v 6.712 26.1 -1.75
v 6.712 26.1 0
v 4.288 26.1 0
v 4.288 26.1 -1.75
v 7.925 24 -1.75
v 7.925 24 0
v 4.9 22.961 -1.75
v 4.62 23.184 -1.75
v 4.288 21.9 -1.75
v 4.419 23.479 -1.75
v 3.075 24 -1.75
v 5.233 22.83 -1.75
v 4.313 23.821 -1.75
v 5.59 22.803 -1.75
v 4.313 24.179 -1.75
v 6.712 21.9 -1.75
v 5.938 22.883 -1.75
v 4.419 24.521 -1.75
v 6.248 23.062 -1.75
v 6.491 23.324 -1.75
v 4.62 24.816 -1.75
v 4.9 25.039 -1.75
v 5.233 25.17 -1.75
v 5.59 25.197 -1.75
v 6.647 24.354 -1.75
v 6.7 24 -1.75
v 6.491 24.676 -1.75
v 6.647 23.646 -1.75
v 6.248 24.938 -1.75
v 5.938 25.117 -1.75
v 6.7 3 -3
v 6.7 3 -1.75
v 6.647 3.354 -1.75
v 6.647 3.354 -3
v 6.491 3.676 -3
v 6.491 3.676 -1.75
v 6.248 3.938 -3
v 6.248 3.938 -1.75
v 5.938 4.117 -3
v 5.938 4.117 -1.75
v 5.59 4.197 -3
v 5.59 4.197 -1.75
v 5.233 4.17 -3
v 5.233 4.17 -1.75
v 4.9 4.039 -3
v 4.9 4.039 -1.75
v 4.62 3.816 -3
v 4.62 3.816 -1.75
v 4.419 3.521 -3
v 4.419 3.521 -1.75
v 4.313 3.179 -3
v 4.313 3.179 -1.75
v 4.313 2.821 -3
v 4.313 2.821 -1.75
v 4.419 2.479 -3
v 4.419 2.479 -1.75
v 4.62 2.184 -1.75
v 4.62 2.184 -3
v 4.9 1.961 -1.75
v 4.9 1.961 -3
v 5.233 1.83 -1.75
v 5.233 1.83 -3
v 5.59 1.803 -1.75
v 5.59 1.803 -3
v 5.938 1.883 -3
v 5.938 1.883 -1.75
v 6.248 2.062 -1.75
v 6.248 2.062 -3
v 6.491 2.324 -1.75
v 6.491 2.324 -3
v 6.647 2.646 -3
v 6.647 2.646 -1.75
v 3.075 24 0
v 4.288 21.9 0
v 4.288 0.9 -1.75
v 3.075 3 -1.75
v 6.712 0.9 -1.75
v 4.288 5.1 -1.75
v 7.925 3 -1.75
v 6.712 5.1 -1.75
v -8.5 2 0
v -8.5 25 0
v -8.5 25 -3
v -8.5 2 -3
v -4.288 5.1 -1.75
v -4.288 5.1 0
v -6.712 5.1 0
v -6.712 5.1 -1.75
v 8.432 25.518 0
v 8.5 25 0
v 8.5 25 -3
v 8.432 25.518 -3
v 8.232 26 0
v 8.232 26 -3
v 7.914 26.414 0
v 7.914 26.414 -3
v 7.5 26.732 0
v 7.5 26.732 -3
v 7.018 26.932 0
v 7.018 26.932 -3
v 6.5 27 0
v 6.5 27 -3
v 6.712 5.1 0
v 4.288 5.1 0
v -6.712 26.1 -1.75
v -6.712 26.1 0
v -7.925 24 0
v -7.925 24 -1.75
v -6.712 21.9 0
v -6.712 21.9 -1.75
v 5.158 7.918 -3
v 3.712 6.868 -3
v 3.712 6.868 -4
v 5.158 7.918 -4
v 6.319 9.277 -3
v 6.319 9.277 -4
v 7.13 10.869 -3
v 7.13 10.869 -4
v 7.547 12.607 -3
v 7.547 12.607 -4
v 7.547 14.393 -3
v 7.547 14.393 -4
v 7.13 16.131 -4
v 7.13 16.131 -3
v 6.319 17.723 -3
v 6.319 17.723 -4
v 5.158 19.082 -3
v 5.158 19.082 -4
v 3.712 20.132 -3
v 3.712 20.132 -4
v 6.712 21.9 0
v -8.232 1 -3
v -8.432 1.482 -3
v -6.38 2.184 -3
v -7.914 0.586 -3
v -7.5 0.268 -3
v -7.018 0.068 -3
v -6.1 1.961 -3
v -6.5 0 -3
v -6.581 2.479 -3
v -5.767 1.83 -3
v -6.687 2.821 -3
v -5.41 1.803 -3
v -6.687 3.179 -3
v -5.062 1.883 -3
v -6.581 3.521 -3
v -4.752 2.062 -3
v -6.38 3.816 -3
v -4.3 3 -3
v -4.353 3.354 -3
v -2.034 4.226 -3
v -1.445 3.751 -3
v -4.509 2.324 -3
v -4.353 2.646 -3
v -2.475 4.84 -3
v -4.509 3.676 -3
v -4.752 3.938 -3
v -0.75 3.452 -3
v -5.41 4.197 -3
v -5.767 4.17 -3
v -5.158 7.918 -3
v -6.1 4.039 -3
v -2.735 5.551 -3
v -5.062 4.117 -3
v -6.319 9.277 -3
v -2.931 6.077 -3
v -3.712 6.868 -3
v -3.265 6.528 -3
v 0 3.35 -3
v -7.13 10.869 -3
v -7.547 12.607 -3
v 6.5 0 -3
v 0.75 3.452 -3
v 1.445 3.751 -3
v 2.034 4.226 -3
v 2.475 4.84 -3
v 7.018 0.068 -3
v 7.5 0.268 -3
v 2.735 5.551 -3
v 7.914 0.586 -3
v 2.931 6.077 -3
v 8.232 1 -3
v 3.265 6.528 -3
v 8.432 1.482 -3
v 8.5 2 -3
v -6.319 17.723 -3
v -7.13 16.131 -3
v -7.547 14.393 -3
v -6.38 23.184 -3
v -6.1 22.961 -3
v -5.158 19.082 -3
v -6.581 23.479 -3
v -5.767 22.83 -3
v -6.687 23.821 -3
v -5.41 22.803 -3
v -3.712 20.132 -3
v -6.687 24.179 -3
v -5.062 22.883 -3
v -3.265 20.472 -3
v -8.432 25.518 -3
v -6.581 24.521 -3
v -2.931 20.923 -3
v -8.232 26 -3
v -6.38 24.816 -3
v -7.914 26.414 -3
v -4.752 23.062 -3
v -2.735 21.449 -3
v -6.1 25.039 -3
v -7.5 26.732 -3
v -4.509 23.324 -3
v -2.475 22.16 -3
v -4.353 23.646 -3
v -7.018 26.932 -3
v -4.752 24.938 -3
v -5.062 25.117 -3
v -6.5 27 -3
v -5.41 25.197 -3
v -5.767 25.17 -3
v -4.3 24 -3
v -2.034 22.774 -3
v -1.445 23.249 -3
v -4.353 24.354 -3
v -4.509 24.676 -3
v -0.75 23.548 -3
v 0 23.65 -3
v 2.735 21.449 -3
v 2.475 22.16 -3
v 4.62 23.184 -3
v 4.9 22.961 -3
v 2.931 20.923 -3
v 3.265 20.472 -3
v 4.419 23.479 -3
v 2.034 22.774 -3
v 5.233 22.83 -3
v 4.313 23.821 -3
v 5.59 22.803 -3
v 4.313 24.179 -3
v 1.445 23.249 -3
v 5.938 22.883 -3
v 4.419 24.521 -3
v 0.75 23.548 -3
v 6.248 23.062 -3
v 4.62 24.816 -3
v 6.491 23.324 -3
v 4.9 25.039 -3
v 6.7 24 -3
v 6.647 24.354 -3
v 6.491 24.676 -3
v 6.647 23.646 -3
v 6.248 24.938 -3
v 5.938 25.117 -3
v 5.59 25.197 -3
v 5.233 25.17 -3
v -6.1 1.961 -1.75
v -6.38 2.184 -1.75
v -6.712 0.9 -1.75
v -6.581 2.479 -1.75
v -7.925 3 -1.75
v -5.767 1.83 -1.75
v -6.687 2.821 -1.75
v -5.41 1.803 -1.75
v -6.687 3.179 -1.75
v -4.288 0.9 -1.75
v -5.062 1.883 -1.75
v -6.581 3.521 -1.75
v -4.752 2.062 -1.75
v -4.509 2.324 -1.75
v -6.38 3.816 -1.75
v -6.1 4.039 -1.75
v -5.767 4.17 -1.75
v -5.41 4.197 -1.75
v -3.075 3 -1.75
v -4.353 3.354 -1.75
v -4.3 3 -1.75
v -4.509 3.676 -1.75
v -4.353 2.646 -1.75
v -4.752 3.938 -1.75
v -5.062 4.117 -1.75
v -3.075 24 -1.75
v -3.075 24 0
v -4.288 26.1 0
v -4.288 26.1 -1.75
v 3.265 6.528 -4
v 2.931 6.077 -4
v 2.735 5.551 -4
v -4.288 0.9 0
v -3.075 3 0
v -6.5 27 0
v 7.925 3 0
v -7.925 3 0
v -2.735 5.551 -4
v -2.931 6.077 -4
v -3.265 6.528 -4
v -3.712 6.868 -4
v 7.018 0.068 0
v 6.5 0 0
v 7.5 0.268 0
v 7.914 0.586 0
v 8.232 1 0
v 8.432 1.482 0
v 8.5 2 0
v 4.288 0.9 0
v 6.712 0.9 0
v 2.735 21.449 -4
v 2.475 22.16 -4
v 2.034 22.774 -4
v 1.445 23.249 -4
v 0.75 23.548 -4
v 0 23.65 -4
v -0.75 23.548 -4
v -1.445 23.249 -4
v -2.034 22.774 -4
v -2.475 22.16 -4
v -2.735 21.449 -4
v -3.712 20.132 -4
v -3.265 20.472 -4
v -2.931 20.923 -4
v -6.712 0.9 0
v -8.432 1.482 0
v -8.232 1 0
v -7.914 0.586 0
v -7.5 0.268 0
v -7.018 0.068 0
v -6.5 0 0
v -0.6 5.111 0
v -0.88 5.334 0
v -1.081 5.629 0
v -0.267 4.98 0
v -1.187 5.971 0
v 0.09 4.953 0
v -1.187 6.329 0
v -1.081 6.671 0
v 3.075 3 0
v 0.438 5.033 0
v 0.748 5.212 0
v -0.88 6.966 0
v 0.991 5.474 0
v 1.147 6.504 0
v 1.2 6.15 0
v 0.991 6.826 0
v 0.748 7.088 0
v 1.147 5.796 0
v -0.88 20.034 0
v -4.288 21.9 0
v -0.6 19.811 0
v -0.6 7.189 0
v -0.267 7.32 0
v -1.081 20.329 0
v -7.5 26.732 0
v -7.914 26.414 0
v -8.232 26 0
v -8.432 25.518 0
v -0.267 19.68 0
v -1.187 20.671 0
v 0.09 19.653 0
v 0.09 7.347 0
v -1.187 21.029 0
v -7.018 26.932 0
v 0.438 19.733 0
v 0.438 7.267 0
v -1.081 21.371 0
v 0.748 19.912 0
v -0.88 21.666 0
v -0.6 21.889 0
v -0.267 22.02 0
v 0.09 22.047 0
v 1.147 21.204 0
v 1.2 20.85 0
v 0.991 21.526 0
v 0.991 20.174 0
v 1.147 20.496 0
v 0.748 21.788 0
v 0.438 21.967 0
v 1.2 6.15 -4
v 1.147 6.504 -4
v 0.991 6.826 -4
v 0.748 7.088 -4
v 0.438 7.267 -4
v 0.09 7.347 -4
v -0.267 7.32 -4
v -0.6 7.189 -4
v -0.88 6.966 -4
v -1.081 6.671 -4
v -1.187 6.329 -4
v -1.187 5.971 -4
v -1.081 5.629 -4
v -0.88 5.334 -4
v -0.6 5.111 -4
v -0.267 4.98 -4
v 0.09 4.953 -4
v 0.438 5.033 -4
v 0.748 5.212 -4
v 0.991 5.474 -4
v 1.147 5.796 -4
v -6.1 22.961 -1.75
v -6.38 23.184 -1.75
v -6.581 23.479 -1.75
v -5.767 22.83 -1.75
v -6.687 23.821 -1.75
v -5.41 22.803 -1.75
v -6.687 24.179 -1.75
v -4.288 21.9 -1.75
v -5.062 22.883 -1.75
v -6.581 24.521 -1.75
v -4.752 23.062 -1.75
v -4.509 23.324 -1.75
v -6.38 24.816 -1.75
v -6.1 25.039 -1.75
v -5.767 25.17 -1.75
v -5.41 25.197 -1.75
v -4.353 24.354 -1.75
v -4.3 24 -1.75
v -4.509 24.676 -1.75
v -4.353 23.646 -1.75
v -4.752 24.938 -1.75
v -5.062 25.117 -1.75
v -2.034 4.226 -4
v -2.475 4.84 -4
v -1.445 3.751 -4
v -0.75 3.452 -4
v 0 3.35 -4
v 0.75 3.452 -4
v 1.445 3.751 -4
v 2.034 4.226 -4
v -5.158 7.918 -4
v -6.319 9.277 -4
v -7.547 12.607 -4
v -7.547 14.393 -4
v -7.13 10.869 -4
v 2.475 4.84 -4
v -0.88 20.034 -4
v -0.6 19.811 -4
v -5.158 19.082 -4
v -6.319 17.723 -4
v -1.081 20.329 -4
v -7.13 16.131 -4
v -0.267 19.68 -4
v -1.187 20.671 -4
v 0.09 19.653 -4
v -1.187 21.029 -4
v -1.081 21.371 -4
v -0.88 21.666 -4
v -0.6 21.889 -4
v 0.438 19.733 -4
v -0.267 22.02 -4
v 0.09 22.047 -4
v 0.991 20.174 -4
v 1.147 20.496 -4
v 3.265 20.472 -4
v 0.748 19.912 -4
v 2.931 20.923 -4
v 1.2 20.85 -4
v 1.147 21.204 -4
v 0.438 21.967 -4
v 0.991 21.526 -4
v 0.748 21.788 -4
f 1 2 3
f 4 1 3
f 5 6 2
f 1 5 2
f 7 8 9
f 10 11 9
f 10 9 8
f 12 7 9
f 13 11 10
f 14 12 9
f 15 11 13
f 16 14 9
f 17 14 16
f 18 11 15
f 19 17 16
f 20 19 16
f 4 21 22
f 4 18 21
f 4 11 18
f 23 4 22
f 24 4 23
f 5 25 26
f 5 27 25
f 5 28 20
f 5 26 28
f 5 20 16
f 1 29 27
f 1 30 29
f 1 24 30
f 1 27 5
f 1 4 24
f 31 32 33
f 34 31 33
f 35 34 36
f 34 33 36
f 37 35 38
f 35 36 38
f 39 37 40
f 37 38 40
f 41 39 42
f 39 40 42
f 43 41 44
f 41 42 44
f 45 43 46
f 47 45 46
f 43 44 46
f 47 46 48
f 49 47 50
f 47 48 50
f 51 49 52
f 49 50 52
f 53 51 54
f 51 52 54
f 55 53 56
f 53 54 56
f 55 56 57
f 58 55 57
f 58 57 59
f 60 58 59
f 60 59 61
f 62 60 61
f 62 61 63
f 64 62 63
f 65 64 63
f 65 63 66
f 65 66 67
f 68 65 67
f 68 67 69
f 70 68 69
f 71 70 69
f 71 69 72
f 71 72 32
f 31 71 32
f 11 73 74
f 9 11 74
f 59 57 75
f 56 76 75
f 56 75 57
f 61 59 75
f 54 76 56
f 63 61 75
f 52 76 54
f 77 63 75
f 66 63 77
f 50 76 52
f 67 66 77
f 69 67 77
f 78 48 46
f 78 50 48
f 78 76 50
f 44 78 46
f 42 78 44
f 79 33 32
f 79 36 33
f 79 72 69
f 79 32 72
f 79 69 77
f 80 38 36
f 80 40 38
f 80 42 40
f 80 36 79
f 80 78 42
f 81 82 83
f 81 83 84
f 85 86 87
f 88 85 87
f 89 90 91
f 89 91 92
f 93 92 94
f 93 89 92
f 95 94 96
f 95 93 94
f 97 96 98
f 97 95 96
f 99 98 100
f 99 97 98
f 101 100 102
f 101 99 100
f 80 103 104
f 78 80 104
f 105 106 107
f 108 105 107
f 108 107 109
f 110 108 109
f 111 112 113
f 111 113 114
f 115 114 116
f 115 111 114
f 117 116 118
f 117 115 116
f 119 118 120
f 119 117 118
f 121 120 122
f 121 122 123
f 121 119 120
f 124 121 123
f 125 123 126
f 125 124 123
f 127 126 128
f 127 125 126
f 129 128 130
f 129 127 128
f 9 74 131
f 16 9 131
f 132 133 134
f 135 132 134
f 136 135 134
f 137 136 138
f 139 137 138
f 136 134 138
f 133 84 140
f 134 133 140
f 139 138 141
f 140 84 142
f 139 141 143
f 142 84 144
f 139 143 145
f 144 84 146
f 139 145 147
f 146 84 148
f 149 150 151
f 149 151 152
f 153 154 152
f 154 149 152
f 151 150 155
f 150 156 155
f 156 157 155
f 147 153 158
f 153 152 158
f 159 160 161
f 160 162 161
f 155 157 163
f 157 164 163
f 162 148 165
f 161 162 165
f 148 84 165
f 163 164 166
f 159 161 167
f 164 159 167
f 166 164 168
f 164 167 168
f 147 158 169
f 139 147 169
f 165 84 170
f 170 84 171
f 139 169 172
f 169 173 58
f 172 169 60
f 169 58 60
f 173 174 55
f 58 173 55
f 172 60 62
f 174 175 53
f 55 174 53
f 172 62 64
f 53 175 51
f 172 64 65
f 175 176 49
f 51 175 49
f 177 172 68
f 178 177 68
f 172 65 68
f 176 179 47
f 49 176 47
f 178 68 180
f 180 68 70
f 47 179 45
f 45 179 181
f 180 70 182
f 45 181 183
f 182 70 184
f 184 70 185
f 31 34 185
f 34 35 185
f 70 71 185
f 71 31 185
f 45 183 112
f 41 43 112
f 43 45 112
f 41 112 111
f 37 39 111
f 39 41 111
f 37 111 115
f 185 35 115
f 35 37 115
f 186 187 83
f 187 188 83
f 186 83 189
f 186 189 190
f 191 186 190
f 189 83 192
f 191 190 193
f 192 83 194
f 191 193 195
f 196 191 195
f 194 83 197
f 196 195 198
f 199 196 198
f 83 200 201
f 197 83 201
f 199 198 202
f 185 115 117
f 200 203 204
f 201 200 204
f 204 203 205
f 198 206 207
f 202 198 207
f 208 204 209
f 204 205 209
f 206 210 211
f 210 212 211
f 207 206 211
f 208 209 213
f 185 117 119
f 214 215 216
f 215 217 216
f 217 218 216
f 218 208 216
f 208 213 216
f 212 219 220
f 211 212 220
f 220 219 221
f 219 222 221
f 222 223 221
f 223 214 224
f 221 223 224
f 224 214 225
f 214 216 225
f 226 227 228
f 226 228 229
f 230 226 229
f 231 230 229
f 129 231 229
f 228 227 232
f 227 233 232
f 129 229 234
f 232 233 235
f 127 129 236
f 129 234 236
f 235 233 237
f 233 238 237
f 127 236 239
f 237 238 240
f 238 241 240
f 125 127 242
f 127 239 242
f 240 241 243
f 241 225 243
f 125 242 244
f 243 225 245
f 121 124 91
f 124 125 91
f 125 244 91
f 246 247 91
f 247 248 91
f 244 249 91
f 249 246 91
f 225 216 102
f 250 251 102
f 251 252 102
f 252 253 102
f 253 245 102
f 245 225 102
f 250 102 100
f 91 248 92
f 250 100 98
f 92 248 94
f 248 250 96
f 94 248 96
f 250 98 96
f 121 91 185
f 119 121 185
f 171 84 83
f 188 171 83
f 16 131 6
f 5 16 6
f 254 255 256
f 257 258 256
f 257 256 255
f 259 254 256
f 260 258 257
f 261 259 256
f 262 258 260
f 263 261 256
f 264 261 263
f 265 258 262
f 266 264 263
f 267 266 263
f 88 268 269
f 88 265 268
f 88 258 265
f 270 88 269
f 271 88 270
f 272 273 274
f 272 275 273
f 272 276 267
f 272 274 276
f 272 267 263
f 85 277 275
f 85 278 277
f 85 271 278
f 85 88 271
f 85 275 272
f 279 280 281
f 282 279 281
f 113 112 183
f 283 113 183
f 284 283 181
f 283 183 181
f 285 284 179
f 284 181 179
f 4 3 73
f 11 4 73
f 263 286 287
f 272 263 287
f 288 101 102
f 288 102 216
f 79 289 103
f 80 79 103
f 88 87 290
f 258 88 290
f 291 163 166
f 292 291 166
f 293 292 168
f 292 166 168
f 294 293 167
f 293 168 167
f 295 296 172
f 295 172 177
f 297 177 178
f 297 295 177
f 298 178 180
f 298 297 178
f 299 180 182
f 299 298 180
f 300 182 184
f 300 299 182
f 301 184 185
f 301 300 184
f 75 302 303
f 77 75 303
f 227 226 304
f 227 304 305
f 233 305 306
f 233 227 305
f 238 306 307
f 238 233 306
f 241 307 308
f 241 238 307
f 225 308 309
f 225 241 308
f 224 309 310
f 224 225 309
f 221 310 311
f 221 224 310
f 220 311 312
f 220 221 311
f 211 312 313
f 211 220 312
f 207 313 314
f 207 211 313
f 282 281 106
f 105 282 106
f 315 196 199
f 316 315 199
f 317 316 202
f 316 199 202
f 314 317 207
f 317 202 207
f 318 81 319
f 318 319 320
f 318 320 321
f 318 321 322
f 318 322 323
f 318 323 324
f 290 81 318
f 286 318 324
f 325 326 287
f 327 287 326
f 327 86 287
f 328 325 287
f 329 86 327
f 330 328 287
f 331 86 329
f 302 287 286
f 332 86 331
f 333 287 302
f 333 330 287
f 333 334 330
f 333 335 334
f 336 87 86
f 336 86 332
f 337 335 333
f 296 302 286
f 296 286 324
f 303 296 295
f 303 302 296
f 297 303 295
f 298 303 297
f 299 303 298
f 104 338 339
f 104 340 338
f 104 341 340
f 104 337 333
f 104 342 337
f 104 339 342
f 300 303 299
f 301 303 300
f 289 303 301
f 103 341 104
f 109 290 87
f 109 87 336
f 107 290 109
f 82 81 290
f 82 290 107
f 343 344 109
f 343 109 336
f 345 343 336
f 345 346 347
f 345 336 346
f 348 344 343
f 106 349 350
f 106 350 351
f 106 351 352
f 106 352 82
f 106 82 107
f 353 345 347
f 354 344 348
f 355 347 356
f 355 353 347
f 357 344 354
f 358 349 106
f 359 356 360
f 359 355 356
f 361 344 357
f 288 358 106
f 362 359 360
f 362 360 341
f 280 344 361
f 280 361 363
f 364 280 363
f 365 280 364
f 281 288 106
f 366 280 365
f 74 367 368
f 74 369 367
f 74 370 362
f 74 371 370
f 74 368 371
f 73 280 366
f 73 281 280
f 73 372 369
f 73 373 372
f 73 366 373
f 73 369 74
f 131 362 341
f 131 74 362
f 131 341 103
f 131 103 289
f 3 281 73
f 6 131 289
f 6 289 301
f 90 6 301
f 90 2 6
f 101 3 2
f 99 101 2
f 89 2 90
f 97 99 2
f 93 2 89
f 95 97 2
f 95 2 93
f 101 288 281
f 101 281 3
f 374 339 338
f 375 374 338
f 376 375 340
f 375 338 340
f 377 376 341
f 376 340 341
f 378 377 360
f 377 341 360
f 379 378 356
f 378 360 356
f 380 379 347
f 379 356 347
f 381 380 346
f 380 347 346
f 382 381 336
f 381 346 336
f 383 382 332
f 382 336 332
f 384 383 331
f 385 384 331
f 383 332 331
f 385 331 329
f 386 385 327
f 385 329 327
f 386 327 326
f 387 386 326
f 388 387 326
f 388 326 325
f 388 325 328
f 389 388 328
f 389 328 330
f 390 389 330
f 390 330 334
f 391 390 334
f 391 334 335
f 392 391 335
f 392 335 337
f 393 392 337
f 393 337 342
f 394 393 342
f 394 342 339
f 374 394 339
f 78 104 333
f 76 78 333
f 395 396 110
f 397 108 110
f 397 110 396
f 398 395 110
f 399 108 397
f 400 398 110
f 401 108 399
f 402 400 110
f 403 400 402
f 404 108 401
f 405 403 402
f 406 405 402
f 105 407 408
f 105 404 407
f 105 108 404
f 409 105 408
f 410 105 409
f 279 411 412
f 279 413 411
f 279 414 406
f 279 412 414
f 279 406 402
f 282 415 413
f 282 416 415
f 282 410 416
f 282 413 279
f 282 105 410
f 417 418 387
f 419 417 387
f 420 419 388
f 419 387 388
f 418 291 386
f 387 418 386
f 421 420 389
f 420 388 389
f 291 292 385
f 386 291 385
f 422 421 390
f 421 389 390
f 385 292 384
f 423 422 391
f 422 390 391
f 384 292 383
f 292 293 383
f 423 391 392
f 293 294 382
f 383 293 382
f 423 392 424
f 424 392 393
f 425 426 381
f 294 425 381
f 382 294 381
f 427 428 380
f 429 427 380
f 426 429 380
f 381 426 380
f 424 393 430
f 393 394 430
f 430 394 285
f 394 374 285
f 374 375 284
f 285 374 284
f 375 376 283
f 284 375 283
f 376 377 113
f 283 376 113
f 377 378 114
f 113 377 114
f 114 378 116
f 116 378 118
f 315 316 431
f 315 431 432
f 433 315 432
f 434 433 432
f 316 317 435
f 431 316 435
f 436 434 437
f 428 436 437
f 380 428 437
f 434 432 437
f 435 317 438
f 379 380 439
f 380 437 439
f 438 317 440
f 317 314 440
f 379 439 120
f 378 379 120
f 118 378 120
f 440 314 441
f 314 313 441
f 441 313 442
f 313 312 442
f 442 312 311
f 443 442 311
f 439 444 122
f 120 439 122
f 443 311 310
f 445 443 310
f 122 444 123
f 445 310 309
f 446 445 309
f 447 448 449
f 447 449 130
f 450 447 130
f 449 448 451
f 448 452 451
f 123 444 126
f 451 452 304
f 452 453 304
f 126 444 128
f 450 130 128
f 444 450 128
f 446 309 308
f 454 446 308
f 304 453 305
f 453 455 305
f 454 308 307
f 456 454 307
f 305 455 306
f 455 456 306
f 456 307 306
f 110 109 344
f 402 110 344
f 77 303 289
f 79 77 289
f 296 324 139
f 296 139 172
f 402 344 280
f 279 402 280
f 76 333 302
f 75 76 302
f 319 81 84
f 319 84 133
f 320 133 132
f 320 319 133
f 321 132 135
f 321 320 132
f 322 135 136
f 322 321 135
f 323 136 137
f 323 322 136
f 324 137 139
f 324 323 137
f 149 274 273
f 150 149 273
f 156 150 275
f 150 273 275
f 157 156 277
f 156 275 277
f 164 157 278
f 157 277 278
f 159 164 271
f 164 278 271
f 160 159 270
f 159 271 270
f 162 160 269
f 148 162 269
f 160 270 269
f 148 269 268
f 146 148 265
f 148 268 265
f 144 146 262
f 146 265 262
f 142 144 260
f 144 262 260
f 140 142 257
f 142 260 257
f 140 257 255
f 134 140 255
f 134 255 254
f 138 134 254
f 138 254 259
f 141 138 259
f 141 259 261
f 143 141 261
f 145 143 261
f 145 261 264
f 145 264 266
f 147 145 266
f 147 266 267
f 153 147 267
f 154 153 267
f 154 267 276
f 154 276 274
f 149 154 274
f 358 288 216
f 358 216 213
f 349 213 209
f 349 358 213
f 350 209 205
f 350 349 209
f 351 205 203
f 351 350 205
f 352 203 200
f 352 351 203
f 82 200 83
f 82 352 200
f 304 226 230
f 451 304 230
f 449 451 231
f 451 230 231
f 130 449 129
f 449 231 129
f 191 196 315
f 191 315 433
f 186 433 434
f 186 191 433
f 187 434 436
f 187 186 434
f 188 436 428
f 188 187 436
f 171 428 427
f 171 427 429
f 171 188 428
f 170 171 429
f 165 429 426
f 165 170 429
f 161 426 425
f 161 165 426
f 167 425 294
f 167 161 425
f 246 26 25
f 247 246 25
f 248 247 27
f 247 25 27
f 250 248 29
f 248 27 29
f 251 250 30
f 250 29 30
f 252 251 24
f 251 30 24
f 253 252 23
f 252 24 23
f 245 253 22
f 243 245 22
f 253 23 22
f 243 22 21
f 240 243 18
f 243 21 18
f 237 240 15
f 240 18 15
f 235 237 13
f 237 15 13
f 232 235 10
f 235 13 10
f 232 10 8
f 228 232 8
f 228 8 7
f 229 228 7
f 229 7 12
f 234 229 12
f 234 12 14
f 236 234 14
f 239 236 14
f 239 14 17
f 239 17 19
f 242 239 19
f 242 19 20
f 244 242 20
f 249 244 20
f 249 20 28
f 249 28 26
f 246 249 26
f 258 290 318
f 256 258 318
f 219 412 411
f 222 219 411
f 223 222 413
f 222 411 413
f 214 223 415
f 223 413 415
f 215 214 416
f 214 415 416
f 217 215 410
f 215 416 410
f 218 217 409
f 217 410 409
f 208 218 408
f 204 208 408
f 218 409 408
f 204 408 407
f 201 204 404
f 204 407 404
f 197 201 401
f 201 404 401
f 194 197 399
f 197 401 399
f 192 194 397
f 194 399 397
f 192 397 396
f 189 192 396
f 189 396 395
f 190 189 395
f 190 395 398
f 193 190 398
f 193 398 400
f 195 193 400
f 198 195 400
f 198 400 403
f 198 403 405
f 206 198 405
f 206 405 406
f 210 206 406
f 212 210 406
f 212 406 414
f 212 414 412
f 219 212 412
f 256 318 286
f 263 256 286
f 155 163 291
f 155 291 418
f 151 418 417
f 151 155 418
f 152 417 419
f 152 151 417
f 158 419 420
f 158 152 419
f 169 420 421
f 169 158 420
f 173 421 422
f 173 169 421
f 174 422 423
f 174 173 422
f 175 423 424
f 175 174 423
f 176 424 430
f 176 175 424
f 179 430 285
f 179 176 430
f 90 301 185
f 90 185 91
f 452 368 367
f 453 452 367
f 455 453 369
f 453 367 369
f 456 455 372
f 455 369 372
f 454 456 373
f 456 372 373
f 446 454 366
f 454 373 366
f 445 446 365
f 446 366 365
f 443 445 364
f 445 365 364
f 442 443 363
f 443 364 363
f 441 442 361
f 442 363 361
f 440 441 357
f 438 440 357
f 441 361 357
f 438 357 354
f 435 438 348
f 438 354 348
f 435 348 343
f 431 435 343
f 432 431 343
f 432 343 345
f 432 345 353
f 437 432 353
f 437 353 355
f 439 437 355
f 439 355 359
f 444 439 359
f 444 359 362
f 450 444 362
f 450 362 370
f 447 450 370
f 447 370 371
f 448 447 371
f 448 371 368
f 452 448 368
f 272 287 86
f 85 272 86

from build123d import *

# Parameters (mm, degrees)
PAD001_DEPTH         = 3
SKETCH024_R          = 1.2
POCKET008_DEPTH      = 3.001
PAD002_DEPTH         = 1
SKETCH023_R          = 1.2
POCKET010_DEPTH      = 4.001
POCKET010_DEPTH_BACK = 0.001
POCKET011_DEPTH      = 1.75


with BuildPart() as part:
    # Sketch022 → Pad001 (new body)
    with BuildSketch(Plane.XY):
        with BuildLine():
            Line((-6.5, 0), (6.5, 0))
            ThreePointArc((6.5, 0), (7.914214, 0.585786), (8.5, 2))
            Line((8.5, 2), (8.5, 25))
            ThreePointArc((8.5, 25), (7.914214, 26.414214), (6.5, 27))
            Line((6.5, 27), (-6.5, 27))
            ThreePointArc((-6.5, 27), (-7.914214, 26.414214), (-8.5, 25))
            Line((-8.5, 25), (-8.5, 2))
            ThreePointArc((-8.5, 2), (-7.914214, 0.585786), (-6.5, 0))
        make_face()
    extrude(amount=-PAD001_DEPTH)

    # Sketch024 → Pocket008 (cut, through all)
    with BuildSketch(Plane.XY):
        with Locations((-5.5, 24)):
            Circle(SKETCH024_R)
        with Locations((5.5, 24)):
            Circle(SKETCH024_R)
        with Locations((5.5, 3)):
            Circle(SKETCH024_R)
        with Locations((-5.5, 3)):
            Circle(SKETCH024_R)
    extrude(amount=-POCKET008_DEPTH, mode=Mode.SUBTRACT)

    # Sketch026 (on DatumPlane) → Pad002 (join)
    with BuildSketch(Plane.XY.offset(-3)):
        with BuildLine():
            ThreePointArc((-3.711996, 20.131824), (-7.6, 13.5), (-3.711996, 6.868176))
            ThreePointArc((-2.735155, 5.550893), (-3.08235, 6.314261), (-3.711996, 6.868176))
            ThreePointArc((-2.735155, 5.550893), (0, 3.35), (2.735155, 5.550893))
            ThreePointArc((3.711996, 6.868176), (3.08235, 6.314261), (2.735155, 5.550893))
            ThreePointArc((3.711996, 6.868176), (7.6, 13.5), (3.711996, 20.131824))
            ThreePointArc((2.735155, 21.449107), (3.08235, 20.685739), (3.711996, 20.131824))
            ThreePointArc((2.735155, 21.449107), (0, 23.65), (-2.735155, 21.449107))
            ThreePointArc((-3.711996, 20.131824), (-3.08235, 20.685739), (-2.735155, 21.449107))
        make_face()
    extrude(amount=-PAD002_DEPTH)

    # Sketch023 → Pocket010 (cut, two sides)
    with BuildSketch(Plane.XY) as pocket010_sk:
        with Locations((0, 6.15)):
            Circle(SKETCH023_R)
        with Locations((0, 20.85)):
            Circle(SKETCH023_R)
    extrude(amount=-POCKET010_DEPTH, mode=Mode.SUBTRACT)
    extrude(pocket010_sk.sketch, amount=POCKET010_DEPTH_BACK, mode=Mode.SUBTRACT)

    # Sketch027 → Pocket011 (cut)
    with BuildSketch(Plane.XY):
        Polygon((4.287564, 0.9), (6.712436, 0.9), (7.924871, 3), (6.712436, 5.1), (4.287564, 5.1), (3.075129, 3), align=None)
        Polygon((6.712436, 26.1), (4.287564, 26.1), (3.075129, 24), (4.287564, 21.9), (6.712436, 21.9), (7.924871, 24), align=None)
        Polygon((-4.287564, 21.9), (-3.075129, 24), (-4.287564, 26.1), (-6.712436, 26.1), (-7.924871, 24), (-6.712436, 21.9), align=None)
        Polygon((-4.287564, 0.9), (-3.075129, 3), (-4.287564, 5.1), (-6.712436, 5.1), (-7.924871, 3), (-6.712436, 0.9), align=None)
    extrude(amount=-POCKET011_DEPTH, mode=Mode.SUBTRACT)


solid = part.part
